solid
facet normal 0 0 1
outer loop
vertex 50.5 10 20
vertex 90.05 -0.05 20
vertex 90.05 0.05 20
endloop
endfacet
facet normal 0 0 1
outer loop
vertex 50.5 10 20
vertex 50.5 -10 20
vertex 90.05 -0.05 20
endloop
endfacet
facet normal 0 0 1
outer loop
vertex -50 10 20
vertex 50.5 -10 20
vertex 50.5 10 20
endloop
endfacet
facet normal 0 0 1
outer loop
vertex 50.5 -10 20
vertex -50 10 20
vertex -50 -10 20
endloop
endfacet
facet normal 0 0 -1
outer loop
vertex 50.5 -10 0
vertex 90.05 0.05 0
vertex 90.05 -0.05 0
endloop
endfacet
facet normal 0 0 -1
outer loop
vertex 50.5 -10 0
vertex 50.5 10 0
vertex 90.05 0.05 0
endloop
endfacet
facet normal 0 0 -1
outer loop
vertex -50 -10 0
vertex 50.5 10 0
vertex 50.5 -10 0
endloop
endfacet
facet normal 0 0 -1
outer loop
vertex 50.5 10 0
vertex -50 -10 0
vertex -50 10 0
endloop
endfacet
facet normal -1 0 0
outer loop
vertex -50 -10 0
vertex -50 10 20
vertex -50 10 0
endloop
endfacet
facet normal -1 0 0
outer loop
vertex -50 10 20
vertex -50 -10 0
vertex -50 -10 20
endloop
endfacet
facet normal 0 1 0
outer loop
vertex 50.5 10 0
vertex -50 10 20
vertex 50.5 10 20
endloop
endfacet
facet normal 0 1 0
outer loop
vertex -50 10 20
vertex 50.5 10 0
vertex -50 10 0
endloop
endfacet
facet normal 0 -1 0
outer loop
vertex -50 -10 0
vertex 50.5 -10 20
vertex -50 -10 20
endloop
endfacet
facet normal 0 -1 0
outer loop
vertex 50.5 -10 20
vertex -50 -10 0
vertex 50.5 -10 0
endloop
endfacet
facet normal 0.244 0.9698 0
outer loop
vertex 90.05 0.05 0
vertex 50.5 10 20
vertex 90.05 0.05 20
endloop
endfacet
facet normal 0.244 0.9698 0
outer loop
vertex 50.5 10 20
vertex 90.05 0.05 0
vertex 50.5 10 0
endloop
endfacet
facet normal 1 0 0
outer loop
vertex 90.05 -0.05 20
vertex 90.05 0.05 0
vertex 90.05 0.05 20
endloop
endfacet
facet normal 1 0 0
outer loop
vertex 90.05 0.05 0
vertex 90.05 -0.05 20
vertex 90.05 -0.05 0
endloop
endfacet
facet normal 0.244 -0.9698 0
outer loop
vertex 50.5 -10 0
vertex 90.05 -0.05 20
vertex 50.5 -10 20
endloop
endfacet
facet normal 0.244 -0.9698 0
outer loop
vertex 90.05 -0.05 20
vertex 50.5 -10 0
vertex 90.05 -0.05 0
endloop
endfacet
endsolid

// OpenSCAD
//open source chissel

//Length of chissel handle
L=100; //[0:200]

// Length of tip
t= 40; //[0:100]

//Width of chissel handle
w=20; //[0:50]

//Height of chissel handle
h=20; //[0:20]

// Minimum printing step height
a=0.1; //

translate([0,0,w/2])

union(){
cube([L,h,w], center=true);
hull(){
translate([L/2,0,0])cube([1,h,w], center=true);
rotate([0,90,90])translate([0,-t-L/2,0])cube([w,a,a], center=true);
}
}
